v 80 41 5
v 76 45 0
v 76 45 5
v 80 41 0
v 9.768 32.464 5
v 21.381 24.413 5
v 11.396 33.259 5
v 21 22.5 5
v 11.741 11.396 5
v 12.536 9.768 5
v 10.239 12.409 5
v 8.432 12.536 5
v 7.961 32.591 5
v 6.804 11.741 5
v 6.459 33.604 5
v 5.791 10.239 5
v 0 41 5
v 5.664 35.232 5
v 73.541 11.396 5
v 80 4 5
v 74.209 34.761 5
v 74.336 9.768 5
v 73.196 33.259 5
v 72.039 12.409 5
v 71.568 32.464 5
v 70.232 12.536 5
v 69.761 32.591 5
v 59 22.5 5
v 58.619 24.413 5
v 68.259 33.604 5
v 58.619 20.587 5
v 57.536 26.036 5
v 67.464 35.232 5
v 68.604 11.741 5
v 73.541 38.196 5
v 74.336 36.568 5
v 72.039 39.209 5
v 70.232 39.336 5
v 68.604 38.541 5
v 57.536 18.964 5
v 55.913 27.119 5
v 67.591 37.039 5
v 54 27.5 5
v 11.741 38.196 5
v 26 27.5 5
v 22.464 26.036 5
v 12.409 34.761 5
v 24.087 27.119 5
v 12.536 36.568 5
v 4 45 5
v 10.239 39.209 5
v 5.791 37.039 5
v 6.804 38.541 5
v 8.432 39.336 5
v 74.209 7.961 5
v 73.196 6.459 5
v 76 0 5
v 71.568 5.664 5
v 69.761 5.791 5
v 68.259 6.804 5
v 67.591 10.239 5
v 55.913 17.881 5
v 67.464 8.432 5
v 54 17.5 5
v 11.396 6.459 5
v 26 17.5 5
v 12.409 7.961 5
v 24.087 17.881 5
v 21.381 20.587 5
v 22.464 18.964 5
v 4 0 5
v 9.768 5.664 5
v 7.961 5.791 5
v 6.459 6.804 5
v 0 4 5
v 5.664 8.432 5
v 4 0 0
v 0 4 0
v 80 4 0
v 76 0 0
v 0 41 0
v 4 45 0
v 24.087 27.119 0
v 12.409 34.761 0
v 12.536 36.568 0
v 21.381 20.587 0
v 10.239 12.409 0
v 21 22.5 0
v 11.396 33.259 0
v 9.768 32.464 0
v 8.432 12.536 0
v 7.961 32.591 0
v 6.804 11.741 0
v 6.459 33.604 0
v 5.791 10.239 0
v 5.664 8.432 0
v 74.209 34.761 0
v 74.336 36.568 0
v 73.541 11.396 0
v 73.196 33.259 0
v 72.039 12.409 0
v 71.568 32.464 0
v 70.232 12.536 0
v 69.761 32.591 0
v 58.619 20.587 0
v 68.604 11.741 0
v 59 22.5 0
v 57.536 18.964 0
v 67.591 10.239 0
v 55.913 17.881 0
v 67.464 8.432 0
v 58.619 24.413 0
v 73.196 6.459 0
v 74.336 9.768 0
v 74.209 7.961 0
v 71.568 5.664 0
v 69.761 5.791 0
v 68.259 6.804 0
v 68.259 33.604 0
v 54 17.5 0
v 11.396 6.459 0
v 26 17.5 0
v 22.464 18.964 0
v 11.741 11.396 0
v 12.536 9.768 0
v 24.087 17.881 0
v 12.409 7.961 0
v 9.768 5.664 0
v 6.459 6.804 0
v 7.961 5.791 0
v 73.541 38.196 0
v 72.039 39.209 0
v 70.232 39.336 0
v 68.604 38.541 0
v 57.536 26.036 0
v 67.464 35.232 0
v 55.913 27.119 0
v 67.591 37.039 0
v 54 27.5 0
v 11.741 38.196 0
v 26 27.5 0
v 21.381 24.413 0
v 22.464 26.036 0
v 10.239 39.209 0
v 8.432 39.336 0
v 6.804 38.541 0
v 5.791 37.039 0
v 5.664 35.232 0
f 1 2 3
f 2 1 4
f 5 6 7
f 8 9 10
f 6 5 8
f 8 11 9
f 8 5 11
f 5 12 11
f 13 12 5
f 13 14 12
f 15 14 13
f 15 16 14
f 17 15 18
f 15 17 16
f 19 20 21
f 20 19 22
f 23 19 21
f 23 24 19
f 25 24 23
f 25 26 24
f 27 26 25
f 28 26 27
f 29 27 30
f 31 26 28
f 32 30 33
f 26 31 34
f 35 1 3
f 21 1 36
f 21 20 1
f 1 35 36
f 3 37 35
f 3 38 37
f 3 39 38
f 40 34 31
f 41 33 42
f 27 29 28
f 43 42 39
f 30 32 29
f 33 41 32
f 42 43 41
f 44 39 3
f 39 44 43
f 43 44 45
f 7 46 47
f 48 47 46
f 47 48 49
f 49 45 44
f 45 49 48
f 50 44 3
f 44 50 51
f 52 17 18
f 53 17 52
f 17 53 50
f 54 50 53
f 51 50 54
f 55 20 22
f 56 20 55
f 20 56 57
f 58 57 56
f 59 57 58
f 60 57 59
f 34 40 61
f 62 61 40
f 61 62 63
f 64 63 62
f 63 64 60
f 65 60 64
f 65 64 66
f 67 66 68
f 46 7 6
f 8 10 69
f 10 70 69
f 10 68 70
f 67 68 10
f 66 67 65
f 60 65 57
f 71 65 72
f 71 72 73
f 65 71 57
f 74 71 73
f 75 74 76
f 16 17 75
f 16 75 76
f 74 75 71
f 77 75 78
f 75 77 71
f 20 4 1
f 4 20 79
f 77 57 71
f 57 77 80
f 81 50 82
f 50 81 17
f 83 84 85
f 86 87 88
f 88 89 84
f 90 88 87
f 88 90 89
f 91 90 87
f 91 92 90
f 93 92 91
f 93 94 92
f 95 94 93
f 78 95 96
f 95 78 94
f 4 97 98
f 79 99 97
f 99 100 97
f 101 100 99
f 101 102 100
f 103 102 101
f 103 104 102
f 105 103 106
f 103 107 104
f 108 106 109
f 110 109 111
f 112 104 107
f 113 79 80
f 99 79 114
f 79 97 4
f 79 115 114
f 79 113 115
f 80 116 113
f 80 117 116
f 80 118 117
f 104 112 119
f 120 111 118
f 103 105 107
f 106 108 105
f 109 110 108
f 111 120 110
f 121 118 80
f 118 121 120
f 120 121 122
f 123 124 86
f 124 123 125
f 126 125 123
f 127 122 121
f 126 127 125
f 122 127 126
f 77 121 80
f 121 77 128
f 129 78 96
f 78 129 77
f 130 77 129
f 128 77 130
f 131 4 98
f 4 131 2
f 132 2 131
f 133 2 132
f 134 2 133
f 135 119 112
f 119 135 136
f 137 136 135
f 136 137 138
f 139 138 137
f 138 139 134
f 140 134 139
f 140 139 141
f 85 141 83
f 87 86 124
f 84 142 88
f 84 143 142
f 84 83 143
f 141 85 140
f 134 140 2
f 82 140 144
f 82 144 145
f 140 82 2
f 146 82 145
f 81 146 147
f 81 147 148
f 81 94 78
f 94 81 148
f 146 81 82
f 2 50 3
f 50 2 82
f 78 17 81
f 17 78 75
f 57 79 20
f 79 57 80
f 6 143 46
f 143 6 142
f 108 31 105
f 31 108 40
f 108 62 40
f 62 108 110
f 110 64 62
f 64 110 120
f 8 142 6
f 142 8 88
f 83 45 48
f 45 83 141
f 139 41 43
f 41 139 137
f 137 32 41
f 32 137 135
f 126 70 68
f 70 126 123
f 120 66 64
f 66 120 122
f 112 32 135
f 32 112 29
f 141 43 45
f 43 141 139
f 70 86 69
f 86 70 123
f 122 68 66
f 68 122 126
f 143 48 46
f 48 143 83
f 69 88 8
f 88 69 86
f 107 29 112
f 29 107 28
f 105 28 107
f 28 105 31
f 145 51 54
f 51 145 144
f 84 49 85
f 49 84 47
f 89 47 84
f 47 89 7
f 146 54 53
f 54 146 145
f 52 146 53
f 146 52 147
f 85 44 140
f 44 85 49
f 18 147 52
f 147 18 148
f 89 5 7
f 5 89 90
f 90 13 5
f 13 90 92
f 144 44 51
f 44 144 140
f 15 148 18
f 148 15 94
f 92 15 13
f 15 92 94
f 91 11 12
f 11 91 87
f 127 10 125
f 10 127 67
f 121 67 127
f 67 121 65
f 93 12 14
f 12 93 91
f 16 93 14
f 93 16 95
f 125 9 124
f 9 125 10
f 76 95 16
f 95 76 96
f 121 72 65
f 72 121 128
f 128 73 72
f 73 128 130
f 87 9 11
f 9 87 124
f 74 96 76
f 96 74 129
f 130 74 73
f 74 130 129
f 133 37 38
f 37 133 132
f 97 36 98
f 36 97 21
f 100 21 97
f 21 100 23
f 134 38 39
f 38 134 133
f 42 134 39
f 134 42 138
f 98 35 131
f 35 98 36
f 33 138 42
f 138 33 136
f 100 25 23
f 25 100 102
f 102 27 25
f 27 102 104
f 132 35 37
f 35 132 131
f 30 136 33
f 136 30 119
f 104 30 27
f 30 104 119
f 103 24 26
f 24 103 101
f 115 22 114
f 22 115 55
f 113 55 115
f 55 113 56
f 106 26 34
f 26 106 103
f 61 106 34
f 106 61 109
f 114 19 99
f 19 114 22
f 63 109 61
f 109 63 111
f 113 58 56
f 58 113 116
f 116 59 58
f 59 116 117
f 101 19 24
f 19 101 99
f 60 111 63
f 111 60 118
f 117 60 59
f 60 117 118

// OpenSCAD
$fn = 32;

// ----------------------------------------------------------------------
// Bracket plate: slot plate 80 x 45
// ----------------------------------------------------------------------

// --- parameters (mm) ---
hole_r = 3.5;             // bolt hole radius
plate_t = 5;              // plate thickness, Z (extrusion height)
plate_l = 80;             // plate length
plate_w = 45;             // plate width
slot_l = 28;              // slot straight length
slot_r = 5;               // slot end radius

slot_len = slot_l + 2 * slot_r;
slot_w = 2 * slot_r;
hole_d2 = 2 * hole_r;

profile = [[4, 0], [76, 0], [80, 4], [80, 41], [76, 45], [4, 45], [0, 41], [0, 4]];  // primary outline, 8 points, counter clockwise
void_1 = [[54, 17.5], [55.913, 17.881], [57.536, 18.964], [58.619, 20.587], [59, 22.5], [58.619, 24.413], [57.536, 26.036], [55.913, 27.119], [54, 27.5], [26, 27.5], [24.087, 27.119], [22.464, 26.036], [21.381, 24.413], [21, 22.5], [21.381, 20.587], [22.464, 18.964], [24.087, 17.881], [26, 17.5]];  // grip slot, 18 points
void_2 = [[12.536, 36.568], [11.741, 38.196], [10.239, 39.209], [8.432, 39.336], [6.804, 38.541], [5.791, 37.039], [5.664, 35.232], [6.459, 33.604], [7.961, 32.591], [9.768, 32.464], [11.396, 33.259], [12.409, 34.761]];  // corner hole, 12 points
void_3 = [[12.536, 9.768], [11.741, 11.396], [10.239, 12.409], [8.432, 12.536], [6.804, 11.741], [5.791, 10.239], [5.664, 8.432], [6.459, 6.804], [7.961, 5.791], [9.768, 5.664], [11.396, 6.459], [12.409, 7.961]];  // corner hole, 12 points
void_4 = [[74.336, 36.568], [73.541, 38.196], [72.039, 39.209], [70.232, 39.336], [68.604, 38.541], [67.591, 37.039], [67.464, 35.232], [68.259, 33.604], [69.761, 32.591], [71.568, 32.464], [73.196, 33.259], [74.209, 34.761]];  // corner hole, 12 points
void_5 = [[74.336, 9.768], [73.541, 11.396], [72.039, 12.409], [70.232, 12.536], [68.604, 11.741], [67.591, 10.239], [67.464, 8.432], [68.259, 6.804], [69.761, 5.791], [71.568, 5.664], [73.196, 6.459], [74.209, 7.961]];  // corner hole, 12 points

// --- the one profile operation ---
difference() {
  linear_extrude(height = plate_t) polygon(points = profile);
  translate([0, 0, -1])
    linear_extrude(height = plate_t + 2) polygon(points = void_1);
  translate([0, 0, -1])
    linear_extrude(height = plate_t + 2) polygon(points = void_2);
  translate([0, 0, -1])
    linear_extrude(height = plate_t + 2) polygon(points = void_3);
  translate([0, 0, -1])
    linear_extrude(height = plate_t + 2) polygon(points = void_4);
  translate([0, 0, -1])
    linear_extrude(height = plate_t + 2) polygon(points = void_5);
}
